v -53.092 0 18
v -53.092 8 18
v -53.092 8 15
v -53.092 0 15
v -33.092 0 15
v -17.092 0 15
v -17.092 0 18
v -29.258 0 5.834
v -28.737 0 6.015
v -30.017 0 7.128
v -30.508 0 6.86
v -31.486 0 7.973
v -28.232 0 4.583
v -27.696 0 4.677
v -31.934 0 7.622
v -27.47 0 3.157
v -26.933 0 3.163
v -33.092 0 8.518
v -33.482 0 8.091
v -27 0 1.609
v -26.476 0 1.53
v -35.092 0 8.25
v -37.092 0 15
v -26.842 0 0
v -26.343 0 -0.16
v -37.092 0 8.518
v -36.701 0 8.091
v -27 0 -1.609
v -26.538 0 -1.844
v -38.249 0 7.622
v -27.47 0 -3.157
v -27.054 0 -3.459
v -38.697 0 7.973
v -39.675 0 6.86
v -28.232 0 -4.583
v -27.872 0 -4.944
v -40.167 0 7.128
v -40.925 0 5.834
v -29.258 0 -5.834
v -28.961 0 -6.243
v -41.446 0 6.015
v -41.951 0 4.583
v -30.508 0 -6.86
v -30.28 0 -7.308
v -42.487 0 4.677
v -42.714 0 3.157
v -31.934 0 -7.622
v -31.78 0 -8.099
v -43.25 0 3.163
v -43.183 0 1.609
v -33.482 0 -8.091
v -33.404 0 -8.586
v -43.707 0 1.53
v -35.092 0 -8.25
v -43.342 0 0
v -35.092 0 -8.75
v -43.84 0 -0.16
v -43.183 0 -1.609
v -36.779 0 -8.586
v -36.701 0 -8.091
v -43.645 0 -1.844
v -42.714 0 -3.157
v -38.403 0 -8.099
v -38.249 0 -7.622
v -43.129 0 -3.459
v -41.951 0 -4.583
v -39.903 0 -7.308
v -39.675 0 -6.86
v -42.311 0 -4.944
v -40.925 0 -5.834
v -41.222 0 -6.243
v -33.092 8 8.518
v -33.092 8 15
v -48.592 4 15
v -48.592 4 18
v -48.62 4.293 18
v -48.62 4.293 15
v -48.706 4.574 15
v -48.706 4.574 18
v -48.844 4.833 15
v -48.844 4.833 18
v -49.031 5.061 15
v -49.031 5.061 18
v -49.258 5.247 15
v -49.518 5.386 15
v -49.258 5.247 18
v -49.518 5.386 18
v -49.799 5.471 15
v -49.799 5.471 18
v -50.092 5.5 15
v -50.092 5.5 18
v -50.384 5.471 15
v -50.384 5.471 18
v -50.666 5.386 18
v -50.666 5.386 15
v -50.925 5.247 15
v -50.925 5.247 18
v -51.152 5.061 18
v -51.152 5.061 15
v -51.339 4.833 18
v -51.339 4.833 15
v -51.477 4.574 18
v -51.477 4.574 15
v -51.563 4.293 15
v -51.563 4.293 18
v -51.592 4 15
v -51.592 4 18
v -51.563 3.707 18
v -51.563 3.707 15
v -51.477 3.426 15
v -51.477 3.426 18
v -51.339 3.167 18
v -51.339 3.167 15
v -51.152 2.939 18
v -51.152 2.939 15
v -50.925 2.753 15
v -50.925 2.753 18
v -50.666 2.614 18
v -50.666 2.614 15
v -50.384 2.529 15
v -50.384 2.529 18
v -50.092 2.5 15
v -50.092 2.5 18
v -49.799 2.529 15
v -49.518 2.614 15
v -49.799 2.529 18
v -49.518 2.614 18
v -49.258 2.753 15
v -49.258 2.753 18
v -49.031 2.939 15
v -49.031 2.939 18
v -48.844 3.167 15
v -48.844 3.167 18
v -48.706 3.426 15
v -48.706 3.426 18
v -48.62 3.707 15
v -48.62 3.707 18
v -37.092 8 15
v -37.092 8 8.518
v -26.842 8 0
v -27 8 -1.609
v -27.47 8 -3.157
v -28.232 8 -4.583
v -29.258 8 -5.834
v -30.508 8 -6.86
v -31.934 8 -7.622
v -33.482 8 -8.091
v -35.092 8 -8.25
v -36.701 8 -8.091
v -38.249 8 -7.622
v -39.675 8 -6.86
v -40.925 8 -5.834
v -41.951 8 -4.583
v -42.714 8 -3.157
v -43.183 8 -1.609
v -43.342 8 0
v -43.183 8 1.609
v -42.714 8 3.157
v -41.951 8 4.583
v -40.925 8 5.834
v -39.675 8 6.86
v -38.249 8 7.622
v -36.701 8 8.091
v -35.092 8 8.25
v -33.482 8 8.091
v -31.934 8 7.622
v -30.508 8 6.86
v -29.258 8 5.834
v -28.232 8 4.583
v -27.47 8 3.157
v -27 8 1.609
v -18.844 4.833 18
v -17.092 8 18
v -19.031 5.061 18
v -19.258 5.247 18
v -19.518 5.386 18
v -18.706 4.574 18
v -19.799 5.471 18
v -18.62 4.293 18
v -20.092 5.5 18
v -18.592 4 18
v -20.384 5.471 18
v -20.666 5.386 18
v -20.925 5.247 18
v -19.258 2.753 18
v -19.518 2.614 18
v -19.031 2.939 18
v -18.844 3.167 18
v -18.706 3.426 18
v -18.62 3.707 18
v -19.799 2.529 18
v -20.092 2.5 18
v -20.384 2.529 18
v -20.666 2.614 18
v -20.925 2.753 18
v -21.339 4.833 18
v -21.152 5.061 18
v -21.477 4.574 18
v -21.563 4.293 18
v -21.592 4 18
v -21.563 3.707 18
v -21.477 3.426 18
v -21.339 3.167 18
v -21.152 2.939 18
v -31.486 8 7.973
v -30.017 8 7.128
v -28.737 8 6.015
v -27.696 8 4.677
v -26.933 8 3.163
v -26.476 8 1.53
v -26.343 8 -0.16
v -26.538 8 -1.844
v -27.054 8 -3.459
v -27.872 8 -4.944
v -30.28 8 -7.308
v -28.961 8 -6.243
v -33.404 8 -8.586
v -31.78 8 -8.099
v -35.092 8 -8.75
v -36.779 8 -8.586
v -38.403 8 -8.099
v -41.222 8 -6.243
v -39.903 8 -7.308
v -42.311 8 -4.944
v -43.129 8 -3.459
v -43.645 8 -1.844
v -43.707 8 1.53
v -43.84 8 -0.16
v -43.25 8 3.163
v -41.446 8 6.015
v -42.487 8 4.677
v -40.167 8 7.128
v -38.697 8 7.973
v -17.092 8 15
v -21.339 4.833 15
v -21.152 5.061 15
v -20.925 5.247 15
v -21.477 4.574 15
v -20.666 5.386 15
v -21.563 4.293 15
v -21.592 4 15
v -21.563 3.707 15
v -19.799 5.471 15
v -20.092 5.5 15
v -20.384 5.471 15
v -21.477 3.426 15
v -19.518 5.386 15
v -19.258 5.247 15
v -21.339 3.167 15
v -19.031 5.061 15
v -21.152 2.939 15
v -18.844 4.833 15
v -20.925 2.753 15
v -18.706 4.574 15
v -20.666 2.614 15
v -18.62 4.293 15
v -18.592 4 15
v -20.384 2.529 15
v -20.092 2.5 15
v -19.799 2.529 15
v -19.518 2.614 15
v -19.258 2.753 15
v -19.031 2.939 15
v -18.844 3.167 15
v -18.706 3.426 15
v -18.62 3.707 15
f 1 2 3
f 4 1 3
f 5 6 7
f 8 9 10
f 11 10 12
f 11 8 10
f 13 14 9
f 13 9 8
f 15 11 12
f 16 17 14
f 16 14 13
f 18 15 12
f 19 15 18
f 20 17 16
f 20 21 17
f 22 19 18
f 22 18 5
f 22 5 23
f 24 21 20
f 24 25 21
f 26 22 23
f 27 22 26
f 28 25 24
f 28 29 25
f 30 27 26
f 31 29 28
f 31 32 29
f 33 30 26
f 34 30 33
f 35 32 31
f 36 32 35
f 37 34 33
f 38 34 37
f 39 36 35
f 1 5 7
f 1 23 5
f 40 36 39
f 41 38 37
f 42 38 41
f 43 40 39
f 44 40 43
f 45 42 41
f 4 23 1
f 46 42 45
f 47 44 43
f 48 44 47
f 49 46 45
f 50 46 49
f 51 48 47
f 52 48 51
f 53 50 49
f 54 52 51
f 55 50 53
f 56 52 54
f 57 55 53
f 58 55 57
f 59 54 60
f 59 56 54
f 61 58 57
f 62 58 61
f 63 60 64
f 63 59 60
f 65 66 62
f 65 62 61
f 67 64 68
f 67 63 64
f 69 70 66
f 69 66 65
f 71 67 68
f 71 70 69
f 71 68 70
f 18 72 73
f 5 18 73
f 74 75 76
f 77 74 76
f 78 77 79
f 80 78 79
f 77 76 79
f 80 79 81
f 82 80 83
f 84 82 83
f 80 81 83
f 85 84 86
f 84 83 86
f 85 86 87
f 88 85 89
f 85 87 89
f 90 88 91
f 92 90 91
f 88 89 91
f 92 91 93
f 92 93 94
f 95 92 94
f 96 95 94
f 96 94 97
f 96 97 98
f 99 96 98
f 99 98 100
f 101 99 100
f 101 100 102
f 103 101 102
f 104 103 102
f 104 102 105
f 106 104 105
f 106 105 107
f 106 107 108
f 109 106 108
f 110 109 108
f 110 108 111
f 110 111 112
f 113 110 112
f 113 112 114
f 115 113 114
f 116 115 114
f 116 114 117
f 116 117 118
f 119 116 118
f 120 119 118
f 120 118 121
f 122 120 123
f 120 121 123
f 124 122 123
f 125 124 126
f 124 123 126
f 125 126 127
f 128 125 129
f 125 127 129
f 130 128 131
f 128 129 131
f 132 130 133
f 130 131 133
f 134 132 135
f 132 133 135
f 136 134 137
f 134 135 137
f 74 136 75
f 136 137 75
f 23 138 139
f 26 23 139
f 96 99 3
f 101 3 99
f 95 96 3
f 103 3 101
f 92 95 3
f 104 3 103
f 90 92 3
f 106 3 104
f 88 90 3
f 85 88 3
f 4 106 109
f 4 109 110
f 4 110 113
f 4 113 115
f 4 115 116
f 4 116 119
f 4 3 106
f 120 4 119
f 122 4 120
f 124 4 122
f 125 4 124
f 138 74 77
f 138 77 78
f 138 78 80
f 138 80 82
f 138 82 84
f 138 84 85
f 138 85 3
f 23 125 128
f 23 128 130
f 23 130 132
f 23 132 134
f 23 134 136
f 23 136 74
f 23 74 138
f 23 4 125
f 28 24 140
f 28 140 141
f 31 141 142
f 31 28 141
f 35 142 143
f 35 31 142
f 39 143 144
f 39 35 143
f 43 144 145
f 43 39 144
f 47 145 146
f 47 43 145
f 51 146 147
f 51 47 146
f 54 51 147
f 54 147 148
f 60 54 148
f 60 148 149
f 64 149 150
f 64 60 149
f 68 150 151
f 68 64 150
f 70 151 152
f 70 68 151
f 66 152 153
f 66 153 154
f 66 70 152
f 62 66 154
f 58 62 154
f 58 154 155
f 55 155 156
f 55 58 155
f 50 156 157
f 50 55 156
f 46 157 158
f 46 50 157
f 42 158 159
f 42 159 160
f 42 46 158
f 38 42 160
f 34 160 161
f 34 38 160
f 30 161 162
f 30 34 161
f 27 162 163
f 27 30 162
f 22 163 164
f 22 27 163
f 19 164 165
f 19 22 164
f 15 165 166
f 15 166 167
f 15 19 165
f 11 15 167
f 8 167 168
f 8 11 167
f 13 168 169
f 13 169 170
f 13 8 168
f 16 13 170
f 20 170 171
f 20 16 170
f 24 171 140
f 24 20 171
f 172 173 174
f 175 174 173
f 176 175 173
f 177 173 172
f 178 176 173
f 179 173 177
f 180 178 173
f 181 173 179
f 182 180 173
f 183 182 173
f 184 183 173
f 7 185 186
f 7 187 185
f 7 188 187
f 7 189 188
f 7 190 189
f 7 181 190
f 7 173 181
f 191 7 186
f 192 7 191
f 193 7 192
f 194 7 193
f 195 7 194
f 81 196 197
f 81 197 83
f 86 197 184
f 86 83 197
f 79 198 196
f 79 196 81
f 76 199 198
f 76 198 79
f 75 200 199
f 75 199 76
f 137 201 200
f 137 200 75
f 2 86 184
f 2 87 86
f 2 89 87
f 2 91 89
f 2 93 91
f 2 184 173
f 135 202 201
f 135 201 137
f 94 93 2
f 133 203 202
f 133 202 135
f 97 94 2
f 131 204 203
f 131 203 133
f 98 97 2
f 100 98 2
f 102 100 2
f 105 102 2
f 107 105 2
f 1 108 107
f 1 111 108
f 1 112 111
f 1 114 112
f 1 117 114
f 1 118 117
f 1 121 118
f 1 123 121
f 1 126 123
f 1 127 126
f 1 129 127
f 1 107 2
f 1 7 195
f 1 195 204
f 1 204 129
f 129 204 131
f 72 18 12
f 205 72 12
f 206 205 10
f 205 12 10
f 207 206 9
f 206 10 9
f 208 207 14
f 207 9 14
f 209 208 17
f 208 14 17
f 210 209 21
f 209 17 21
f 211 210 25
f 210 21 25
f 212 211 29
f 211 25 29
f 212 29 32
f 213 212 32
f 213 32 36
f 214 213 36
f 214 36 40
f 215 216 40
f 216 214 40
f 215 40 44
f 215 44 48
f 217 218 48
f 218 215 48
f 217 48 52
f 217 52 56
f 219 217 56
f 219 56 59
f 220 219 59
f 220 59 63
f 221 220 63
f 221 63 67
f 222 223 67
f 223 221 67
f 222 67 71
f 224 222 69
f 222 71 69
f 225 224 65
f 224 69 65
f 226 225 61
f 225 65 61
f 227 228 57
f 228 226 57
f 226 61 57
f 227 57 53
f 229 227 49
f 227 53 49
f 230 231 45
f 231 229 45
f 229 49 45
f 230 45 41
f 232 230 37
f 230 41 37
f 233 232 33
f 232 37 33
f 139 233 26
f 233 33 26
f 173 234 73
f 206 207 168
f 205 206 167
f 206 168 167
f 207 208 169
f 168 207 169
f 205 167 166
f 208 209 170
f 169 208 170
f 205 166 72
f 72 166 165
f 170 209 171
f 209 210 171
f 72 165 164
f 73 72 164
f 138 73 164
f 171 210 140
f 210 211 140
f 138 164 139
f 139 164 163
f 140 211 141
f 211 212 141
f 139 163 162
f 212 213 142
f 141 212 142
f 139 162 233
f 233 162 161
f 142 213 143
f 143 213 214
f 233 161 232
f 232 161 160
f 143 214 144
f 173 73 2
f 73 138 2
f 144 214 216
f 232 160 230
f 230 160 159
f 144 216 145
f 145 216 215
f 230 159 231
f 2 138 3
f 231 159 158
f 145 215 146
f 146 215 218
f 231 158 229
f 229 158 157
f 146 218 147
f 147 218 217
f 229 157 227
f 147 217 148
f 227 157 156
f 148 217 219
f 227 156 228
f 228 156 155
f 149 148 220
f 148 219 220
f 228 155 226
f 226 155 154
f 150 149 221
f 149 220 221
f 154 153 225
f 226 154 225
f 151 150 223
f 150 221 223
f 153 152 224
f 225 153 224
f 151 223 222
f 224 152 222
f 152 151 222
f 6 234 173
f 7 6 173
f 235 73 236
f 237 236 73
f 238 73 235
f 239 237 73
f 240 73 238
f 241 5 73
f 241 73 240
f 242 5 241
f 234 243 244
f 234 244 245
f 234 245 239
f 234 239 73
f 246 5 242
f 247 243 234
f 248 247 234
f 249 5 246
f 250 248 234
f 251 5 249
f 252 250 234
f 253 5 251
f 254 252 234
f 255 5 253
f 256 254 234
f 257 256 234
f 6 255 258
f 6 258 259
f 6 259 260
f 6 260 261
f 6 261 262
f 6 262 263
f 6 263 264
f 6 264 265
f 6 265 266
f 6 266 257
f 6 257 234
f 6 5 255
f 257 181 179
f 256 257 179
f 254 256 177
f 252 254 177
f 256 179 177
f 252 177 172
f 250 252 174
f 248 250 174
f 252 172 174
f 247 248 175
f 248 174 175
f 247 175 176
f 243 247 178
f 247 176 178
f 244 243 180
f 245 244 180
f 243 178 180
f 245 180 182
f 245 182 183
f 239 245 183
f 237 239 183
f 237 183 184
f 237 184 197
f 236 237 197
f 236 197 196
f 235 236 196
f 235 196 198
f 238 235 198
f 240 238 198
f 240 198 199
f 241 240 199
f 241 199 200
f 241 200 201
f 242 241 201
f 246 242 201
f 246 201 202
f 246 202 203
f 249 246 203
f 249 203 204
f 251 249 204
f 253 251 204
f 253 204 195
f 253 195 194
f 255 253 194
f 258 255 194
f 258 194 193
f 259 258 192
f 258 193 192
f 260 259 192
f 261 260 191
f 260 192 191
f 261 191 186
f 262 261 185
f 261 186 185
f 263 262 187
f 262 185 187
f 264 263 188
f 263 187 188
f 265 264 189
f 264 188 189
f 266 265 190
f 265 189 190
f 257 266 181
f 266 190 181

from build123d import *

# Parameters (mm, degrees)
SKETCH_1_R          = 8.75
SKETCH_1_R_2        = 8.25
EXTRUDE_2_DEPTH     = 10
SKETCH_2_R          = 8.25
SKETCH_2_R_2        = 2
EXTRUDE_3_DEPTH     = 4
EXTRUDE_4_DEPTH     = 8
SKETCH_5_W          = 3
SKETCH_5_H          = 8
EXTRUDE_5_DEPTH     = 3
SKETCH_6_W          = 3
SKETCH_6_H          = 8
EXTRUDE_6_DEPTH     = 3
SKETCH_7_R          = 1.5
CUT_EXTRUDE_1_DEPTH = 3
FILLET_1_R          = 5
FILLET_3_R          = 2
SKETCH_8_R          = 8.75
SKETCH_8_R_2        = 8.25
EXTRUDE_7_DEPTH     = 8
SKETCH_9_R          = 8.25
SKETCH_9_R_2        = 6
EXTRUDE_8_DEPTH     = 2
EXTRUDE_9_DEPTH     = 8
SKETCH_11_R         = 1.5
CUT_EXTRUDE_2_DEPTH = 8
CUT_EXTRUDE_3_DEPTH = 8
CUT_EXTRUDE_4_DEPTH = 8
SKETCH_14_R         = 8.75
SKETCH_14_R_2       = 8.25
EXTRUDE_10_DEPTH    = 8
EXTRUDE_11_DEPTH    = 8
SKETCH_16_R         = 1.5
CUT_EXTRUDE_5_DEPTH = 8
CUT_EXTRUDE_6_DEPTH = 10


with BuildPart() as part:
    # 草图1 → 凸台-拉伸2 (new body)
    with BuildSketch(Plane(origin=(0, 0, 0), x_dir=(1, 0, 0), z_dir=(0, 1, 0))):
        Circle(SKETCH_1_R)
        Circle(SKETCH_1_R_2, mode=Mode.SUBTRACT)
    extrude(amount=EXTRUDE_2_DEPTH)

    # 草图2 → 凸台-拉伸3 (add)
    with BuildSketch(Plane(origin=(0, 0, 0), x_dir=(1, 0, 0), z_dir=(0, 1, 0))):
        Circle(SKETCH_2_R)
        Circle(SKETCH_2_R_2, mode=Mode.SUBTRACT)
    extrude(amount=EXTRUDE_3_DEPTH)

    # 草图3 → 凸台-拉伸4 (add)
    with BuildSketch(Plane(origin=(0, 0, 0), x_dir=(1, 0, 0), z_dir=(0, 1, 0))):
        Polygon((-2, 8.518362519), (2, 8.518362519), (2, 15), (15, 15), (15, 18), (2, 18), (-2, 18), (-15, 18), (-15, 15), (-2, 15), align=None)
    extrude(amount=EXTRUDE_4_DEPTH)

    # 草图5 → 凸台-拉伸5 (add)
    with BuildSketch(Plane(origin=(15, 0, 0), x_dir=(0, 0, -1), z_dir=(1, 0, 0))):
        with Locations((16.5, 4)):
            Rectangle(SKETCH_5_W, SKETCH_5_H)
    extrude(amount=EXTRUDE_5_DEPTH)

    # 草图6 → 凸台-拉伸6 (add)
    with BuildSketch(Plane.ZY.offset(15)):
        with Locations((-16.5, 4)):
            Rectangle(SKETCH_6_W, SKETCH_6_H)
    extrude(amount=EXTRUDE_6_DEPTH)

    # 草图7 → 切除-拉伸1 (cut)
    with BuildSketch(Plane(origin=(0, 0, -18), x_dir=(-1, 0, 0), z_dir=(0, 0, -1))):
        with Locations((-15, 3.754021035)):
            Circle(SKETCH_7_R)
    cut_extrude_1 = extrude(amount=-CUT_EXTRUDE_1_DEPTH, mode=Mode.SUBTRACT)

    # 镜向1: 切除-拉伸1 across plane
    add(cut_extrude_1.mirror(Plane(origin=(0, 0, 0), x_dir=(0, 0, 1), z_dir=(1, 0, 0))), mode=Mode.SUBTRACT)

    # 圆角1
    fillet_1_edges = [part.edges().sort_by_distance(p)[0] for p in [
        (-2, 4, -8.518362519),
        (2, 4, -8.518362519),
    ]]
    fillet(fillet_1_edges, radius=FILLET_1_R)

    # 圆角3
    fillet_3_edges = [part.edges().sort_by_distance(p)[0] for p in [
        (-2, 4, -15),
        (2, 4, -15),
    ]]
    fillet(fillet_3_edges, radius=FILLET_3_R)


with BuildPart() as body_2:
    # 草图8 → 凸台-拉伸7 (new body)
    with BuildSketch(Plane(origin=(0, 0, 0), x_dir=(1, 0, 0), z_dir=(0, 1, 0))):
        with Locations((27.184954533, 0)):
            Circle(SKETCH_8_R)
        with Locations((27.184954533, 0)):
            Circle(SKETCH_8_R_2, mode=Mode.SUBTRACT)
    extrude(amount=EXTRUDE_7_DEPTH)

    # 草图9 → 凸台-拉伸8 (add)
    with BuildSketch(Plane.XZ):
        with Locations((27.184954533, 0)):
            Circle(SKETCH_9_R)
        with Locations((27.184954533, 0)):
            Circle(SKETCH_9_R_2, mode=Mode.SUBTRACT)
    extrude(amount=-EXTRUDE_8_DEPTH)

    # 草图10 → 凸台-拉伸9 (add)
    with BuildSketch(Plane(origin=(0, 0, 0), x_dir=(1, 0, 0), z_dir=(0, 1, 0))):
        Polygon((27.184954533, -18), (45.184954533, -18), (45.184954533, -14.663867829), (29.184954533, -14.663867829), (29.184954533, -8.518362519), (25.184954533, -8.518362519), (25.184954533, -14.663867829), (9.184954533, -14.663867829), (9.184954533, -18), align=None)
    extrude(amount=EXTRUDE_9_DEPTH)

    # 草图11 → 切除-拉伸2 (cut)
    with BuildSketch(Plane.XY.offset(18)):
        with Locations((12.184954533, 4)):
            Circle(SKETCH_11_R)
        with Locations((42.184954533, 4)):
            Circle(SKETCH_11_R)
    extrude(amount=-CUT_EXTRUDE_2_DEPTH, mode=Mode.SUBTRACT)

    # 草图12 → 切除-拉伸3 (cut)
    with BuildSketch(Plane.XY.offset(18)):
        with BuildLine():
            Line((10.684954533, 4), (10.684954533, 5))
            ThreePointArc((10.684954533, 5), (12.184954533, 6.5), (13.684954533, 5))
            Line((13.684954533, 5), (13.684954533, 4))
            Line((13.684954533, 4), (13.684954533, 3))
            ThreePointArc((13.684954533, 3), (12.184954533, 1.5), (10.684954533, 3))
            Line((10.684954533, 3), (10.684954533, 4))
        make_face()
    extrude(amount=-CUT_EXTRUDE_3_DEPTH, mode=Mode.SUBTRACT)

    # 草图13 → 切除-拉伸4 (cut)
    with BuildSketch(Plane.XY.offset(18)):
        with BuildLine():
            Line((40.684954533, 4), (40.684954533, 5))
            ThreePointArc((40.684954533, 5), (42.184954533, 6.5), (43.684954533, 5))
            Line((43.684954533, 5), (43.684954533, 4))
            Line((43.684954533, 4), (43.684954533, 3))
            ThreePointArc((43.684954533, 3), (42.184954533, 1.5), (40.684954533, 3))
            Line((40.684954533, 3), (40.684954533, 4))
        make_face()
    extrude(amount=-CUT_EXTRUDE_4_DEPTH, mode=Mode.SUBTRACT)


with BuildPart() as body_3:
    # 草图14 → 凸台-拉伸10 (new body)
    with BuildSketch(Plane(origin=(0, 0, 0), x_dir=(1, 0, 0), z_dir=(0, 1, 0))):
        with Locations((-35.091635024, 0)):
            Circle(SKETCH_14_R)
        with Locations((-35.091635024, 0)):
            Circle(SKETCH_14_R_2, mode=Mode.SUBTRACT)
    extrude(amount=EXTRUDE_10_DEPTH)

    # 草图15 → 凸台-拉伸11 (add)
    with BuildSketch(Plane(origin=(0, 0, 0), x_dir=(1, 0, 0), z_dir=(0, 1, 0))):
        Polygon((-37.091635024, -15), (-37.091635024, -8.518362519), (-33.091635024, -8.518362519), (-33.091635024, -15), (-17.091635024, -15), (-17.091635024, -18), (-53.091635024, -18), (-53.091635024, -15), align=None)
    extrude(amount=EXTRUDE_11_DEPTH)

    # 草图16 → 切除-拉伸5 (cut)
    with BuildSketch(Plane.XY.offset(18)):
        with Locations((-50.091635024, 4)):
            Circle(SKETCH_16_R)
        with Locations((-20.091635024, 4)):
            Circle(SKETCH_16_R)
    extrude(amount=-CUT_EXTRUDE_5_DEPTH, mode=Mode.SUBTRACT)


with BuildPart() as cut_extrude_6_tool:
    # 草图17 → 切除-拉伸6 (new body)
    with BuildSketch(Plane(origin=(0, 0, 0), x_dir=(1, 0, 0), z_dir=(0, 1, 0))):
        Polygon((-22.814109192, 34.802391794), (-16.193349778, -3.968895549), (-7.026713263, -18.825168522), (52.714469541, -30.836623265), (64.093742456, -10), (34.287483401, 32.08598291), align=None)
    extrude(amount=CUT_EXTRUDE_6_DEPTH)


with BuildPart() as part_1:
    add(part.part)

    # 切除-拉伸6: cut by cut_extrude_6_tool
    add(cut_extrude_6_tool.part, mode=Mode.SUBTRACT)


with BuildPart() as body_2_1:
    add(body_2.part)

    # 切除-拉伸6: cut by cut_extrude_6_tool
    add(cut_extrude_6_tool.part, mode=Mode.SUBTRACT)


solid = body_3.part
